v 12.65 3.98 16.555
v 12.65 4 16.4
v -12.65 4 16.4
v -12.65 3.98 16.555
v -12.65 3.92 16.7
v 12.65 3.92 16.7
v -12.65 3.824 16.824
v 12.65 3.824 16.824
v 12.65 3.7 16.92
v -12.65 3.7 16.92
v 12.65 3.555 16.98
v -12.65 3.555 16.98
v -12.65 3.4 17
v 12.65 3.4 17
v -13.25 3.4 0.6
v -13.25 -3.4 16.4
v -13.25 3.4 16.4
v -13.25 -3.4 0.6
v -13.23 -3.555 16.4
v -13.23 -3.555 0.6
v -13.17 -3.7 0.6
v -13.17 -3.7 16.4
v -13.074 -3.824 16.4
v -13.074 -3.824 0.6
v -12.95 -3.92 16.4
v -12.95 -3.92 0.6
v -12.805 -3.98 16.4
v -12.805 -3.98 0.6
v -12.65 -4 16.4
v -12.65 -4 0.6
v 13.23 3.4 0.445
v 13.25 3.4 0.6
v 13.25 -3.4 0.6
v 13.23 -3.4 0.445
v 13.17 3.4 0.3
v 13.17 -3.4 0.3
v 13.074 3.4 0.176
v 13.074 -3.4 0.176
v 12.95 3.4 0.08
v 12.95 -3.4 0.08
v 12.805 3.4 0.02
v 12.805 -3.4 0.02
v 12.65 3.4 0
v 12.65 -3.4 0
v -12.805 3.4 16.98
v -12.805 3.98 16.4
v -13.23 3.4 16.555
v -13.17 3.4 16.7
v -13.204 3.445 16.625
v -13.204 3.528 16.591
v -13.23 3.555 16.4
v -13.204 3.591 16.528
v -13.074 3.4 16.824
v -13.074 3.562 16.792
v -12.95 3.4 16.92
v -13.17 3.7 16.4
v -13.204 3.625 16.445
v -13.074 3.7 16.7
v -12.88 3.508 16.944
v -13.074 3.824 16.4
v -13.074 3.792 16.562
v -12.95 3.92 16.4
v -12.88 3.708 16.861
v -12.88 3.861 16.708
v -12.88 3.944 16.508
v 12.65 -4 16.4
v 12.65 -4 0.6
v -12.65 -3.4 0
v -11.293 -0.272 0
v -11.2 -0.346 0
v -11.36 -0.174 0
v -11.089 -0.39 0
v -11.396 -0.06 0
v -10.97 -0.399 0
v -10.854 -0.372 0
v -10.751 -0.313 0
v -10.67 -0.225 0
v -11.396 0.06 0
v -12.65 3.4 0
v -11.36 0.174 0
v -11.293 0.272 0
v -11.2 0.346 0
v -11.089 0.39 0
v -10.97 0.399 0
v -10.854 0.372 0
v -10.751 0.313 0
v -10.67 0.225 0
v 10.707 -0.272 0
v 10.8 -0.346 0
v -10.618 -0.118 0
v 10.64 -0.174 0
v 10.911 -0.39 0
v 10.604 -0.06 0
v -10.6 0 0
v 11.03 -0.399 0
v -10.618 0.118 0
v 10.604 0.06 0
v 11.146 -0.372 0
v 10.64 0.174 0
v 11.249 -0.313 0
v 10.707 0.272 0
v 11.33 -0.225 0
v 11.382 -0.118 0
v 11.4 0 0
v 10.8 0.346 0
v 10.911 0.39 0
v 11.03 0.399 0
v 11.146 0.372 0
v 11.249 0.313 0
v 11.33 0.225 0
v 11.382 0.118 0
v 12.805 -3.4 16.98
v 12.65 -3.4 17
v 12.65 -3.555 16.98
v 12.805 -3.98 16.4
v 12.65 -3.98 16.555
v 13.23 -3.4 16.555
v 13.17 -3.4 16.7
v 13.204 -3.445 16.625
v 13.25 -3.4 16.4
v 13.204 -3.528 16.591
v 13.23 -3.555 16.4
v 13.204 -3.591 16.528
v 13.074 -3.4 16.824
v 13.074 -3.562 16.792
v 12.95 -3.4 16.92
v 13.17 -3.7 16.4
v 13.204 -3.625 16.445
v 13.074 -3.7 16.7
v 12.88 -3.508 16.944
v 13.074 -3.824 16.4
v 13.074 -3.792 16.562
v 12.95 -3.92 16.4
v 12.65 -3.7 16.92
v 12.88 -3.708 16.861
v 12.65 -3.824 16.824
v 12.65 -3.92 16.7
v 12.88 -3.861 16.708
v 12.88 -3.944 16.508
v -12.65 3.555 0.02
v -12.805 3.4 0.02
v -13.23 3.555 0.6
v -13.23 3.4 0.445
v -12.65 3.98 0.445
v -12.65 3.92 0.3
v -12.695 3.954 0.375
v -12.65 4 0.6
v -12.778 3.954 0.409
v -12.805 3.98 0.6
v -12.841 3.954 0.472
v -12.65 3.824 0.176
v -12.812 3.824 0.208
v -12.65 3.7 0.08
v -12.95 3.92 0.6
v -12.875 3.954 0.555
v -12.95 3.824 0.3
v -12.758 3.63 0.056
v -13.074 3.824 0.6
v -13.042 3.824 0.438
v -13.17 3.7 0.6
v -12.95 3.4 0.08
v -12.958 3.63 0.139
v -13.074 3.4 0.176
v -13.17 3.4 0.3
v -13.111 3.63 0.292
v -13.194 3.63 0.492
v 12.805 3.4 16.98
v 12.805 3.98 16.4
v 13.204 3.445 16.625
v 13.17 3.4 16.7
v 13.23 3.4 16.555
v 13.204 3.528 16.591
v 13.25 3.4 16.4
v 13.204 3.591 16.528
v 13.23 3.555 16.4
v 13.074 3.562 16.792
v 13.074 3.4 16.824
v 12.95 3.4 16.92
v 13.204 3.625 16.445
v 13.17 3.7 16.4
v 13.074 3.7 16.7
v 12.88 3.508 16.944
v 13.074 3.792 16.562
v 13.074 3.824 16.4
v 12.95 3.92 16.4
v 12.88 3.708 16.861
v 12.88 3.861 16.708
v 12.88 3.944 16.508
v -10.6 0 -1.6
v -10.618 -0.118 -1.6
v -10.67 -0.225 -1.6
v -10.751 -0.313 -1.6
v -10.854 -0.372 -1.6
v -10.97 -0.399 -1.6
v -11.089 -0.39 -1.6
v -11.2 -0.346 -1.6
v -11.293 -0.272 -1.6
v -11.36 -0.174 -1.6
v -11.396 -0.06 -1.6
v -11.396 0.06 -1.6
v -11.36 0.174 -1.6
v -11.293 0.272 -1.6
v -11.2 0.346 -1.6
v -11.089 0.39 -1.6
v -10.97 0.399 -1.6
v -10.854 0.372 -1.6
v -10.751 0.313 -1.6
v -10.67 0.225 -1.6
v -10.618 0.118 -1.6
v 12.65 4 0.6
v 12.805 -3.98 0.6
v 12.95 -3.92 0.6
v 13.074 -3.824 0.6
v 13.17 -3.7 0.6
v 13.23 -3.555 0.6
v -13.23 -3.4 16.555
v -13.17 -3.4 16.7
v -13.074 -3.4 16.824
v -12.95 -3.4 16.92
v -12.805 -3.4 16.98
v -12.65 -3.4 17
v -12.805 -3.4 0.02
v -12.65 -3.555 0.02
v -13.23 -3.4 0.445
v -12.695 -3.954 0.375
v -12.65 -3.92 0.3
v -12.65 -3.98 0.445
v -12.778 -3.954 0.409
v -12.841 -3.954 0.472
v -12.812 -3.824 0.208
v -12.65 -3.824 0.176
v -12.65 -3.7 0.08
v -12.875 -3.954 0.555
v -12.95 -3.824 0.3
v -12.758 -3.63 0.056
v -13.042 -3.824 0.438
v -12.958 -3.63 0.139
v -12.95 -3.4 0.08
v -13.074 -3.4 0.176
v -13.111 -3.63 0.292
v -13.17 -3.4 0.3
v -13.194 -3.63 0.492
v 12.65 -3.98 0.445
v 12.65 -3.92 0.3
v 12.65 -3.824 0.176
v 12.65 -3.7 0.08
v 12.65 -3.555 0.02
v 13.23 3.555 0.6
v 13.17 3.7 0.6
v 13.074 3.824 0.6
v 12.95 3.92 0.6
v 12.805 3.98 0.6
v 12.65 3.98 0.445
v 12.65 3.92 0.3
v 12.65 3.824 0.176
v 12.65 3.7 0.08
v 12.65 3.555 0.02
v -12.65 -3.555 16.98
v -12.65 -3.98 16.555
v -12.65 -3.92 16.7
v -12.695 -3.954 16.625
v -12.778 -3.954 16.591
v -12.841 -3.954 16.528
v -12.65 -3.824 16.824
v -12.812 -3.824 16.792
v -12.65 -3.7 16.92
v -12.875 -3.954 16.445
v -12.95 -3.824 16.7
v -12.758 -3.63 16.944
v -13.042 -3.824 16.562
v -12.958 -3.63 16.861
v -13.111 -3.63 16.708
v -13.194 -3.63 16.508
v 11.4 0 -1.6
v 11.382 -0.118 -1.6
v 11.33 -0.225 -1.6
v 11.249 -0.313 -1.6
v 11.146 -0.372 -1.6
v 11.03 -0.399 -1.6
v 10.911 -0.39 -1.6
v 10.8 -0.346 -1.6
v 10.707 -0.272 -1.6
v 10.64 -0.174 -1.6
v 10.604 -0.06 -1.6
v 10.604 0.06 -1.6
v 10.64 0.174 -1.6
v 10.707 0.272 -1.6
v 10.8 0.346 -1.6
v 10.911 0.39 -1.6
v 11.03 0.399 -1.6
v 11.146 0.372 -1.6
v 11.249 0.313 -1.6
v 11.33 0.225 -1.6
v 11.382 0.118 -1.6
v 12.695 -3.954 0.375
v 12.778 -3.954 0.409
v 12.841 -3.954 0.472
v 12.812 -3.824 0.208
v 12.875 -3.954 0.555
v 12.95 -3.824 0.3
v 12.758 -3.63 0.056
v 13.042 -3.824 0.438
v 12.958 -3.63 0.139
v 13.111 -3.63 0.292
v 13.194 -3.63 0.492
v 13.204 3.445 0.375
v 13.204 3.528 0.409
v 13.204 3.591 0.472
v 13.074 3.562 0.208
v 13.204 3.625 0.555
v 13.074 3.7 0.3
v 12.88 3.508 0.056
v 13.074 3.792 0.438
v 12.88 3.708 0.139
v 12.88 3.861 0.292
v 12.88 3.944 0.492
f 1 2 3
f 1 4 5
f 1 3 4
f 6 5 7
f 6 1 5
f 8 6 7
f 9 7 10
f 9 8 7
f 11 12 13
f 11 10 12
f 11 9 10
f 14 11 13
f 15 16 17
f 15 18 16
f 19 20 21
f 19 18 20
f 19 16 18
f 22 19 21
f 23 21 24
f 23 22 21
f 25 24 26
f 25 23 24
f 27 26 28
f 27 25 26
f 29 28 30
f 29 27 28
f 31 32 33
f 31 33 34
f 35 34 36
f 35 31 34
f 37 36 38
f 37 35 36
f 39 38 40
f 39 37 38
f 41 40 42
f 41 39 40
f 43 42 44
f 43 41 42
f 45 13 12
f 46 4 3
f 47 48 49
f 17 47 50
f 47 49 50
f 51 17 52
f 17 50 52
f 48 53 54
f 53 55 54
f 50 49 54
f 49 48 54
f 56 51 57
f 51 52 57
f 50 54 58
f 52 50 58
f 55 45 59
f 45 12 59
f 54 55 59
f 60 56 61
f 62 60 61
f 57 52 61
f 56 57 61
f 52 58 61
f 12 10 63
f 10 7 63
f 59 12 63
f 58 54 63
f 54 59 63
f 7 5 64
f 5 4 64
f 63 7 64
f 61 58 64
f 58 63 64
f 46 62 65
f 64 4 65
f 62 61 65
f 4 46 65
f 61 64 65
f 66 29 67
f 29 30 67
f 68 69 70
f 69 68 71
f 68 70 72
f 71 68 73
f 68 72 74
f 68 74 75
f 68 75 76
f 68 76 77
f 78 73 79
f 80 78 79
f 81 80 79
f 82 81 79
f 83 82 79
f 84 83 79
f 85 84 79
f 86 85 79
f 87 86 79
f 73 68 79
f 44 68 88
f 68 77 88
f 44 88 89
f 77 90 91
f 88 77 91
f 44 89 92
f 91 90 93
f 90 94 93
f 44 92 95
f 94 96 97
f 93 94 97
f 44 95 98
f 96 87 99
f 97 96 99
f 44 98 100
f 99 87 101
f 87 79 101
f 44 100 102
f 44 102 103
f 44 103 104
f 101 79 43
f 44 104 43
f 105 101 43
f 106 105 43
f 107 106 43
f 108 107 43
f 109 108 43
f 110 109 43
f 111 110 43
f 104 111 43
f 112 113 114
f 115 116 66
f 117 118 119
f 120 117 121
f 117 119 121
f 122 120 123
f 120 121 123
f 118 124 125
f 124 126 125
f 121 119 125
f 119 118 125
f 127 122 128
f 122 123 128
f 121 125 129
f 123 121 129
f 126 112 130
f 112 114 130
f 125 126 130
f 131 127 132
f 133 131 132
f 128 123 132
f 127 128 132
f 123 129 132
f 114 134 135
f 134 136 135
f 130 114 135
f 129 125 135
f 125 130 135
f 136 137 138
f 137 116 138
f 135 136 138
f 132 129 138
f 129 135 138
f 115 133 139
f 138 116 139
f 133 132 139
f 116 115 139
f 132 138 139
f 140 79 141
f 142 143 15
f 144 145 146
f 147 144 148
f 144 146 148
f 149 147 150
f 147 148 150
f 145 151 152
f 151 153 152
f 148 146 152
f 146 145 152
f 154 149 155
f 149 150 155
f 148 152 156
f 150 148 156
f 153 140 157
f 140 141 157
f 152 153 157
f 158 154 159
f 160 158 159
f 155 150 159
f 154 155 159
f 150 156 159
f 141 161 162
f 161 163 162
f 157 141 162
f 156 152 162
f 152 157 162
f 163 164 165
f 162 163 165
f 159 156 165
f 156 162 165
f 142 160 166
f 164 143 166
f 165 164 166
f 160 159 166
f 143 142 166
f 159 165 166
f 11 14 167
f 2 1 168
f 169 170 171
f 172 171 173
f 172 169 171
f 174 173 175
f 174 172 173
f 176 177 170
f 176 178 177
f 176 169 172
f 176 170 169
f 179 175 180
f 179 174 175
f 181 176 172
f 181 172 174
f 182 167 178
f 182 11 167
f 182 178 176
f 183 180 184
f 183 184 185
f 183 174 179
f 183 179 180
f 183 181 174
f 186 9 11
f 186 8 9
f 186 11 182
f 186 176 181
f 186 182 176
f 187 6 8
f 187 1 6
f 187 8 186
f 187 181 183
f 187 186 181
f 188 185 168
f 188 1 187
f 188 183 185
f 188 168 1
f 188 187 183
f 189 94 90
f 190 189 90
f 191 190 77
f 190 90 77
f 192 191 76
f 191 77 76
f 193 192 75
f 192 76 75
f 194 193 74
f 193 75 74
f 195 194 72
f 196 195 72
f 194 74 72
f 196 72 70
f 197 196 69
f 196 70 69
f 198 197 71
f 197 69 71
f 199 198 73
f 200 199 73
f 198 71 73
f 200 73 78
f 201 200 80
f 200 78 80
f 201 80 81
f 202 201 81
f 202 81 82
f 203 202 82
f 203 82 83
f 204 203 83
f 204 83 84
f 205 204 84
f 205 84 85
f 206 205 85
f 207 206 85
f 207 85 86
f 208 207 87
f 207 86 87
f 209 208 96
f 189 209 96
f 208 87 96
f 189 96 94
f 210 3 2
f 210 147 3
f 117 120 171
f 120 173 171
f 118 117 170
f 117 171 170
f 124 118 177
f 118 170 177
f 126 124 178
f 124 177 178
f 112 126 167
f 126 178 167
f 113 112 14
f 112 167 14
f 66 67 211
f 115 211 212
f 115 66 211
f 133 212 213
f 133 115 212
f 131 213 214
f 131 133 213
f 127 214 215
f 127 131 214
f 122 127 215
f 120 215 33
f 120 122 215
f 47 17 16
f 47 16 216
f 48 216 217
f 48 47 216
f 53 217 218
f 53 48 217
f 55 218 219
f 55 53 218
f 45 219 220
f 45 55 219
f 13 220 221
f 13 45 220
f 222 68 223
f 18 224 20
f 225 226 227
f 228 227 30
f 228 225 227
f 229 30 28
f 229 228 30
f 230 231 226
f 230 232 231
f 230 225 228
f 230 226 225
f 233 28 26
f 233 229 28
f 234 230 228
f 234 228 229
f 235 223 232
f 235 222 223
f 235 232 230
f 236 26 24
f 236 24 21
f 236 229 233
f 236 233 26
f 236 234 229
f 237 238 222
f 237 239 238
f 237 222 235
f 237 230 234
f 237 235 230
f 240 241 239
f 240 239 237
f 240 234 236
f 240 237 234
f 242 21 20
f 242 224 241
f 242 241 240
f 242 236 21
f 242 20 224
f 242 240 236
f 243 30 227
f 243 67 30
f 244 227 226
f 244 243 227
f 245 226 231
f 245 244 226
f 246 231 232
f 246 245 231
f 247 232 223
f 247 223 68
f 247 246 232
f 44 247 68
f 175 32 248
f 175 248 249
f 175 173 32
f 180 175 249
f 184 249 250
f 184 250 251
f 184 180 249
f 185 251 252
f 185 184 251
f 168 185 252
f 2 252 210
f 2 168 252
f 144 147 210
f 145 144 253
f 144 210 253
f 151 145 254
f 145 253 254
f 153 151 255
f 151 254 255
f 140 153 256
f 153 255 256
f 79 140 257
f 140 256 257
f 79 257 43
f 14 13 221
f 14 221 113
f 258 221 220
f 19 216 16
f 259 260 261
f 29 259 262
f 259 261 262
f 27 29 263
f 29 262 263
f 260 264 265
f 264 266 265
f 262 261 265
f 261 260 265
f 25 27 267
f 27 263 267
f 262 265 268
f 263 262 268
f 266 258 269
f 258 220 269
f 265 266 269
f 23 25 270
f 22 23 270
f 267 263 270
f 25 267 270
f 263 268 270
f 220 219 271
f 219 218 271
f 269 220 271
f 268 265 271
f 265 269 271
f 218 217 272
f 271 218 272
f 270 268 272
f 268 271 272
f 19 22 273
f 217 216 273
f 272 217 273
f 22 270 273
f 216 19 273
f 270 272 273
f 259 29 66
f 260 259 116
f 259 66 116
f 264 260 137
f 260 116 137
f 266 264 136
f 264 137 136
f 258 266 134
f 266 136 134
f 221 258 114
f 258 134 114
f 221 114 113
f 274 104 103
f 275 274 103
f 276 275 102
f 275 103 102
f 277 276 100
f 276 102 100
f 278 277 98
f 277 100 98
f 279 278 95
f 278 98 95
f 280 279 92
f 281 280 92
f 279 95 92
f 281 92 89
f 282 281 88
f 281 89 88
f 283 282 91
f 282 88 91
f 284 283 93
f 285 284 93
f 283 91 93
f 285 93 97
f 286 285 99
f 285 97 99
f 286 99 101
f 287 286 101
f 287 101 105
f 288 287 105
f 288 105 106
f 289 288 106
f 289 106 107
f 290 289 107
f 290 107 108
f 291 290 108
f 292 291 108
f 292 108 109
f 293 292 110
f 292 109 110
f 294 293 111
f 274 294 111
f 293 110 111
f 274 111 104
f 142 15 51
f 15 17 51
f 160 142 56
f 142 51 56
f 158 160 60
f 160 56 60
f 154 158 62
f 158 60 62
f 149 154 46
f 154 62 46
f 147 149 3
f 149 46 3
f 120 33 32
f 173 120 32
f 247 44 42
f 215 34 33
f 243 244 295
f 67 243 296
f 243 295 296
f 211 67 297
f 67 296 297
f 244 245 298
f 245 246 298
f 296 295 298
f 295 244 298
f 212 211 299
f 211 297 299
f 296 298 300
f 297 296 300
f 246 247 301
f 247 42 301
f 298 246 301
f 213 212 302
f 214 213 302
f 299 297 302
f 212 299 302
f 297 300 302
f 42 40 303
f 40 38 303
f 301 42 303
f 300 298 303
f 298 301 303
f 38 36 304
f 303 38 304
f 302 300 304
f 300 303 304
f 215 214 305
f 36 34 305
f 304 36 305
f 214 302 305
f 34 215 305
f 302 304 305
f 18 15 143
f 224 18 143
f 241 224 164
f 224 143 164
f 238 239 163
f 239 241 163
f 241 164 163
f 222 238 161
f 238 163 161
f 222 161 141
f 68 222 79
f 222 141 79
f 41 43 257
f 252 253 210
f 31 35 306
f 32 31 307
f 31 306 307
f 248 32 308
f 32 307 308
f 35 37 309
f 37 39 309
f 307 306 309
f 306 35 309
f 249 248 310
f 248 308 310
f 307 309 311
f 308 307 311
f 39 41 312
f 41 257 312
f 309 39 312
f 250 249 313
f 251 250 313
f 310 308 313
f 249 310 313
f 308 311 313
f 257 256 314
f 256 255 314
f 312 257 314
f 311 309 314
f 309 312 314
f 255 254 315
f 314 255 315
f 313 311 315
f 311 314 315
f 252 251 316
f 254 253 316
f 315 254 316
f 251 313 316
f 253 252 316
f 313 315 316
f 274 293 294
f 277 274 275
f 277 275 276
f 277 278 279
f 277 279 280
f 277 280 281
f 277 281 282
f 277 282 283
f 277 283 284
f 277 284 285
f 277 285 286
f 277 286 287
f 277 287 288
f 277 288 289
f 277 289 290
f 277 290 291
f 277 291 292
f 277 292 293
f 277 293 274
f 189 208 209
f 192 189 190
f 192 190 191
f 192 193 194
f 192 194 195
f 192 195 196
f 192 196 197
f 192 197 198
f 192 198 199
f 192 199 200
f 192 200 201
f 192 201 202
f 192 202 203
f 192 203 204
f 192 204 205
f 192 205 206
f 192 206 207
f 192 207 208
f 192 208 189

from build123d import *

# Parameters (mm, degrees)
SKETCH_1_W      = 26.5
SKETCH_1_H      = 8
EXTRUDE_1_DEPTH = 17
FILLET_1_R      = 0.6
SKETCH_2_R      = 0.4
EXTRUDE_2_DEPTH = 1.6


with BuildPart() as part:
    # 草图1 → 凸台-拉伸1 (new body)
    with BuildSketch(Plane.XY):
        Rectangle(SKETCH_1_W, SKETCH_1_H)
    extrude(amount=EXTRUDE_1_DEPTH)

    # 圆角1
    fillet_1_edges = [part.edges().sort_by_distance(p)[0] for p in [
        (0, 4, 17),
        (-13.25, 0, 17),
        (0, -4, 17),
        (-13.25, 0, 0),
        (0, 4, 0),
        (13.25, 0, 0),
        (0, -4, 0),
        (13.25, 0, 17),
        (-13.25, -4, 8.5),
        (-13.25, 4, 8.5),
        (13.25, 4, 8.5),
        (13.25, -4, 8.5),
    ]]
    fillet(fillet_1_edges, radius=FILLET_1_R)

    # 草图2 → 凸台-拉伸2 (add)
    with BuildSketch(Plane(origin=(0, 0, 0), x_dir=(-1, 0, 0), z_dir=(0, 0, -1))):
        with Locations(Location((11, 0, 0), (0, 0, 180))):
            Circle(SKETCH_2_R)
        with Locations(Location((-11, 0, 0), (0, 0, 180))):
            Circle(SKETCH_2_R)
    extrude(amount=EXTRUDE_2_DEPTH)


solid = part.part
